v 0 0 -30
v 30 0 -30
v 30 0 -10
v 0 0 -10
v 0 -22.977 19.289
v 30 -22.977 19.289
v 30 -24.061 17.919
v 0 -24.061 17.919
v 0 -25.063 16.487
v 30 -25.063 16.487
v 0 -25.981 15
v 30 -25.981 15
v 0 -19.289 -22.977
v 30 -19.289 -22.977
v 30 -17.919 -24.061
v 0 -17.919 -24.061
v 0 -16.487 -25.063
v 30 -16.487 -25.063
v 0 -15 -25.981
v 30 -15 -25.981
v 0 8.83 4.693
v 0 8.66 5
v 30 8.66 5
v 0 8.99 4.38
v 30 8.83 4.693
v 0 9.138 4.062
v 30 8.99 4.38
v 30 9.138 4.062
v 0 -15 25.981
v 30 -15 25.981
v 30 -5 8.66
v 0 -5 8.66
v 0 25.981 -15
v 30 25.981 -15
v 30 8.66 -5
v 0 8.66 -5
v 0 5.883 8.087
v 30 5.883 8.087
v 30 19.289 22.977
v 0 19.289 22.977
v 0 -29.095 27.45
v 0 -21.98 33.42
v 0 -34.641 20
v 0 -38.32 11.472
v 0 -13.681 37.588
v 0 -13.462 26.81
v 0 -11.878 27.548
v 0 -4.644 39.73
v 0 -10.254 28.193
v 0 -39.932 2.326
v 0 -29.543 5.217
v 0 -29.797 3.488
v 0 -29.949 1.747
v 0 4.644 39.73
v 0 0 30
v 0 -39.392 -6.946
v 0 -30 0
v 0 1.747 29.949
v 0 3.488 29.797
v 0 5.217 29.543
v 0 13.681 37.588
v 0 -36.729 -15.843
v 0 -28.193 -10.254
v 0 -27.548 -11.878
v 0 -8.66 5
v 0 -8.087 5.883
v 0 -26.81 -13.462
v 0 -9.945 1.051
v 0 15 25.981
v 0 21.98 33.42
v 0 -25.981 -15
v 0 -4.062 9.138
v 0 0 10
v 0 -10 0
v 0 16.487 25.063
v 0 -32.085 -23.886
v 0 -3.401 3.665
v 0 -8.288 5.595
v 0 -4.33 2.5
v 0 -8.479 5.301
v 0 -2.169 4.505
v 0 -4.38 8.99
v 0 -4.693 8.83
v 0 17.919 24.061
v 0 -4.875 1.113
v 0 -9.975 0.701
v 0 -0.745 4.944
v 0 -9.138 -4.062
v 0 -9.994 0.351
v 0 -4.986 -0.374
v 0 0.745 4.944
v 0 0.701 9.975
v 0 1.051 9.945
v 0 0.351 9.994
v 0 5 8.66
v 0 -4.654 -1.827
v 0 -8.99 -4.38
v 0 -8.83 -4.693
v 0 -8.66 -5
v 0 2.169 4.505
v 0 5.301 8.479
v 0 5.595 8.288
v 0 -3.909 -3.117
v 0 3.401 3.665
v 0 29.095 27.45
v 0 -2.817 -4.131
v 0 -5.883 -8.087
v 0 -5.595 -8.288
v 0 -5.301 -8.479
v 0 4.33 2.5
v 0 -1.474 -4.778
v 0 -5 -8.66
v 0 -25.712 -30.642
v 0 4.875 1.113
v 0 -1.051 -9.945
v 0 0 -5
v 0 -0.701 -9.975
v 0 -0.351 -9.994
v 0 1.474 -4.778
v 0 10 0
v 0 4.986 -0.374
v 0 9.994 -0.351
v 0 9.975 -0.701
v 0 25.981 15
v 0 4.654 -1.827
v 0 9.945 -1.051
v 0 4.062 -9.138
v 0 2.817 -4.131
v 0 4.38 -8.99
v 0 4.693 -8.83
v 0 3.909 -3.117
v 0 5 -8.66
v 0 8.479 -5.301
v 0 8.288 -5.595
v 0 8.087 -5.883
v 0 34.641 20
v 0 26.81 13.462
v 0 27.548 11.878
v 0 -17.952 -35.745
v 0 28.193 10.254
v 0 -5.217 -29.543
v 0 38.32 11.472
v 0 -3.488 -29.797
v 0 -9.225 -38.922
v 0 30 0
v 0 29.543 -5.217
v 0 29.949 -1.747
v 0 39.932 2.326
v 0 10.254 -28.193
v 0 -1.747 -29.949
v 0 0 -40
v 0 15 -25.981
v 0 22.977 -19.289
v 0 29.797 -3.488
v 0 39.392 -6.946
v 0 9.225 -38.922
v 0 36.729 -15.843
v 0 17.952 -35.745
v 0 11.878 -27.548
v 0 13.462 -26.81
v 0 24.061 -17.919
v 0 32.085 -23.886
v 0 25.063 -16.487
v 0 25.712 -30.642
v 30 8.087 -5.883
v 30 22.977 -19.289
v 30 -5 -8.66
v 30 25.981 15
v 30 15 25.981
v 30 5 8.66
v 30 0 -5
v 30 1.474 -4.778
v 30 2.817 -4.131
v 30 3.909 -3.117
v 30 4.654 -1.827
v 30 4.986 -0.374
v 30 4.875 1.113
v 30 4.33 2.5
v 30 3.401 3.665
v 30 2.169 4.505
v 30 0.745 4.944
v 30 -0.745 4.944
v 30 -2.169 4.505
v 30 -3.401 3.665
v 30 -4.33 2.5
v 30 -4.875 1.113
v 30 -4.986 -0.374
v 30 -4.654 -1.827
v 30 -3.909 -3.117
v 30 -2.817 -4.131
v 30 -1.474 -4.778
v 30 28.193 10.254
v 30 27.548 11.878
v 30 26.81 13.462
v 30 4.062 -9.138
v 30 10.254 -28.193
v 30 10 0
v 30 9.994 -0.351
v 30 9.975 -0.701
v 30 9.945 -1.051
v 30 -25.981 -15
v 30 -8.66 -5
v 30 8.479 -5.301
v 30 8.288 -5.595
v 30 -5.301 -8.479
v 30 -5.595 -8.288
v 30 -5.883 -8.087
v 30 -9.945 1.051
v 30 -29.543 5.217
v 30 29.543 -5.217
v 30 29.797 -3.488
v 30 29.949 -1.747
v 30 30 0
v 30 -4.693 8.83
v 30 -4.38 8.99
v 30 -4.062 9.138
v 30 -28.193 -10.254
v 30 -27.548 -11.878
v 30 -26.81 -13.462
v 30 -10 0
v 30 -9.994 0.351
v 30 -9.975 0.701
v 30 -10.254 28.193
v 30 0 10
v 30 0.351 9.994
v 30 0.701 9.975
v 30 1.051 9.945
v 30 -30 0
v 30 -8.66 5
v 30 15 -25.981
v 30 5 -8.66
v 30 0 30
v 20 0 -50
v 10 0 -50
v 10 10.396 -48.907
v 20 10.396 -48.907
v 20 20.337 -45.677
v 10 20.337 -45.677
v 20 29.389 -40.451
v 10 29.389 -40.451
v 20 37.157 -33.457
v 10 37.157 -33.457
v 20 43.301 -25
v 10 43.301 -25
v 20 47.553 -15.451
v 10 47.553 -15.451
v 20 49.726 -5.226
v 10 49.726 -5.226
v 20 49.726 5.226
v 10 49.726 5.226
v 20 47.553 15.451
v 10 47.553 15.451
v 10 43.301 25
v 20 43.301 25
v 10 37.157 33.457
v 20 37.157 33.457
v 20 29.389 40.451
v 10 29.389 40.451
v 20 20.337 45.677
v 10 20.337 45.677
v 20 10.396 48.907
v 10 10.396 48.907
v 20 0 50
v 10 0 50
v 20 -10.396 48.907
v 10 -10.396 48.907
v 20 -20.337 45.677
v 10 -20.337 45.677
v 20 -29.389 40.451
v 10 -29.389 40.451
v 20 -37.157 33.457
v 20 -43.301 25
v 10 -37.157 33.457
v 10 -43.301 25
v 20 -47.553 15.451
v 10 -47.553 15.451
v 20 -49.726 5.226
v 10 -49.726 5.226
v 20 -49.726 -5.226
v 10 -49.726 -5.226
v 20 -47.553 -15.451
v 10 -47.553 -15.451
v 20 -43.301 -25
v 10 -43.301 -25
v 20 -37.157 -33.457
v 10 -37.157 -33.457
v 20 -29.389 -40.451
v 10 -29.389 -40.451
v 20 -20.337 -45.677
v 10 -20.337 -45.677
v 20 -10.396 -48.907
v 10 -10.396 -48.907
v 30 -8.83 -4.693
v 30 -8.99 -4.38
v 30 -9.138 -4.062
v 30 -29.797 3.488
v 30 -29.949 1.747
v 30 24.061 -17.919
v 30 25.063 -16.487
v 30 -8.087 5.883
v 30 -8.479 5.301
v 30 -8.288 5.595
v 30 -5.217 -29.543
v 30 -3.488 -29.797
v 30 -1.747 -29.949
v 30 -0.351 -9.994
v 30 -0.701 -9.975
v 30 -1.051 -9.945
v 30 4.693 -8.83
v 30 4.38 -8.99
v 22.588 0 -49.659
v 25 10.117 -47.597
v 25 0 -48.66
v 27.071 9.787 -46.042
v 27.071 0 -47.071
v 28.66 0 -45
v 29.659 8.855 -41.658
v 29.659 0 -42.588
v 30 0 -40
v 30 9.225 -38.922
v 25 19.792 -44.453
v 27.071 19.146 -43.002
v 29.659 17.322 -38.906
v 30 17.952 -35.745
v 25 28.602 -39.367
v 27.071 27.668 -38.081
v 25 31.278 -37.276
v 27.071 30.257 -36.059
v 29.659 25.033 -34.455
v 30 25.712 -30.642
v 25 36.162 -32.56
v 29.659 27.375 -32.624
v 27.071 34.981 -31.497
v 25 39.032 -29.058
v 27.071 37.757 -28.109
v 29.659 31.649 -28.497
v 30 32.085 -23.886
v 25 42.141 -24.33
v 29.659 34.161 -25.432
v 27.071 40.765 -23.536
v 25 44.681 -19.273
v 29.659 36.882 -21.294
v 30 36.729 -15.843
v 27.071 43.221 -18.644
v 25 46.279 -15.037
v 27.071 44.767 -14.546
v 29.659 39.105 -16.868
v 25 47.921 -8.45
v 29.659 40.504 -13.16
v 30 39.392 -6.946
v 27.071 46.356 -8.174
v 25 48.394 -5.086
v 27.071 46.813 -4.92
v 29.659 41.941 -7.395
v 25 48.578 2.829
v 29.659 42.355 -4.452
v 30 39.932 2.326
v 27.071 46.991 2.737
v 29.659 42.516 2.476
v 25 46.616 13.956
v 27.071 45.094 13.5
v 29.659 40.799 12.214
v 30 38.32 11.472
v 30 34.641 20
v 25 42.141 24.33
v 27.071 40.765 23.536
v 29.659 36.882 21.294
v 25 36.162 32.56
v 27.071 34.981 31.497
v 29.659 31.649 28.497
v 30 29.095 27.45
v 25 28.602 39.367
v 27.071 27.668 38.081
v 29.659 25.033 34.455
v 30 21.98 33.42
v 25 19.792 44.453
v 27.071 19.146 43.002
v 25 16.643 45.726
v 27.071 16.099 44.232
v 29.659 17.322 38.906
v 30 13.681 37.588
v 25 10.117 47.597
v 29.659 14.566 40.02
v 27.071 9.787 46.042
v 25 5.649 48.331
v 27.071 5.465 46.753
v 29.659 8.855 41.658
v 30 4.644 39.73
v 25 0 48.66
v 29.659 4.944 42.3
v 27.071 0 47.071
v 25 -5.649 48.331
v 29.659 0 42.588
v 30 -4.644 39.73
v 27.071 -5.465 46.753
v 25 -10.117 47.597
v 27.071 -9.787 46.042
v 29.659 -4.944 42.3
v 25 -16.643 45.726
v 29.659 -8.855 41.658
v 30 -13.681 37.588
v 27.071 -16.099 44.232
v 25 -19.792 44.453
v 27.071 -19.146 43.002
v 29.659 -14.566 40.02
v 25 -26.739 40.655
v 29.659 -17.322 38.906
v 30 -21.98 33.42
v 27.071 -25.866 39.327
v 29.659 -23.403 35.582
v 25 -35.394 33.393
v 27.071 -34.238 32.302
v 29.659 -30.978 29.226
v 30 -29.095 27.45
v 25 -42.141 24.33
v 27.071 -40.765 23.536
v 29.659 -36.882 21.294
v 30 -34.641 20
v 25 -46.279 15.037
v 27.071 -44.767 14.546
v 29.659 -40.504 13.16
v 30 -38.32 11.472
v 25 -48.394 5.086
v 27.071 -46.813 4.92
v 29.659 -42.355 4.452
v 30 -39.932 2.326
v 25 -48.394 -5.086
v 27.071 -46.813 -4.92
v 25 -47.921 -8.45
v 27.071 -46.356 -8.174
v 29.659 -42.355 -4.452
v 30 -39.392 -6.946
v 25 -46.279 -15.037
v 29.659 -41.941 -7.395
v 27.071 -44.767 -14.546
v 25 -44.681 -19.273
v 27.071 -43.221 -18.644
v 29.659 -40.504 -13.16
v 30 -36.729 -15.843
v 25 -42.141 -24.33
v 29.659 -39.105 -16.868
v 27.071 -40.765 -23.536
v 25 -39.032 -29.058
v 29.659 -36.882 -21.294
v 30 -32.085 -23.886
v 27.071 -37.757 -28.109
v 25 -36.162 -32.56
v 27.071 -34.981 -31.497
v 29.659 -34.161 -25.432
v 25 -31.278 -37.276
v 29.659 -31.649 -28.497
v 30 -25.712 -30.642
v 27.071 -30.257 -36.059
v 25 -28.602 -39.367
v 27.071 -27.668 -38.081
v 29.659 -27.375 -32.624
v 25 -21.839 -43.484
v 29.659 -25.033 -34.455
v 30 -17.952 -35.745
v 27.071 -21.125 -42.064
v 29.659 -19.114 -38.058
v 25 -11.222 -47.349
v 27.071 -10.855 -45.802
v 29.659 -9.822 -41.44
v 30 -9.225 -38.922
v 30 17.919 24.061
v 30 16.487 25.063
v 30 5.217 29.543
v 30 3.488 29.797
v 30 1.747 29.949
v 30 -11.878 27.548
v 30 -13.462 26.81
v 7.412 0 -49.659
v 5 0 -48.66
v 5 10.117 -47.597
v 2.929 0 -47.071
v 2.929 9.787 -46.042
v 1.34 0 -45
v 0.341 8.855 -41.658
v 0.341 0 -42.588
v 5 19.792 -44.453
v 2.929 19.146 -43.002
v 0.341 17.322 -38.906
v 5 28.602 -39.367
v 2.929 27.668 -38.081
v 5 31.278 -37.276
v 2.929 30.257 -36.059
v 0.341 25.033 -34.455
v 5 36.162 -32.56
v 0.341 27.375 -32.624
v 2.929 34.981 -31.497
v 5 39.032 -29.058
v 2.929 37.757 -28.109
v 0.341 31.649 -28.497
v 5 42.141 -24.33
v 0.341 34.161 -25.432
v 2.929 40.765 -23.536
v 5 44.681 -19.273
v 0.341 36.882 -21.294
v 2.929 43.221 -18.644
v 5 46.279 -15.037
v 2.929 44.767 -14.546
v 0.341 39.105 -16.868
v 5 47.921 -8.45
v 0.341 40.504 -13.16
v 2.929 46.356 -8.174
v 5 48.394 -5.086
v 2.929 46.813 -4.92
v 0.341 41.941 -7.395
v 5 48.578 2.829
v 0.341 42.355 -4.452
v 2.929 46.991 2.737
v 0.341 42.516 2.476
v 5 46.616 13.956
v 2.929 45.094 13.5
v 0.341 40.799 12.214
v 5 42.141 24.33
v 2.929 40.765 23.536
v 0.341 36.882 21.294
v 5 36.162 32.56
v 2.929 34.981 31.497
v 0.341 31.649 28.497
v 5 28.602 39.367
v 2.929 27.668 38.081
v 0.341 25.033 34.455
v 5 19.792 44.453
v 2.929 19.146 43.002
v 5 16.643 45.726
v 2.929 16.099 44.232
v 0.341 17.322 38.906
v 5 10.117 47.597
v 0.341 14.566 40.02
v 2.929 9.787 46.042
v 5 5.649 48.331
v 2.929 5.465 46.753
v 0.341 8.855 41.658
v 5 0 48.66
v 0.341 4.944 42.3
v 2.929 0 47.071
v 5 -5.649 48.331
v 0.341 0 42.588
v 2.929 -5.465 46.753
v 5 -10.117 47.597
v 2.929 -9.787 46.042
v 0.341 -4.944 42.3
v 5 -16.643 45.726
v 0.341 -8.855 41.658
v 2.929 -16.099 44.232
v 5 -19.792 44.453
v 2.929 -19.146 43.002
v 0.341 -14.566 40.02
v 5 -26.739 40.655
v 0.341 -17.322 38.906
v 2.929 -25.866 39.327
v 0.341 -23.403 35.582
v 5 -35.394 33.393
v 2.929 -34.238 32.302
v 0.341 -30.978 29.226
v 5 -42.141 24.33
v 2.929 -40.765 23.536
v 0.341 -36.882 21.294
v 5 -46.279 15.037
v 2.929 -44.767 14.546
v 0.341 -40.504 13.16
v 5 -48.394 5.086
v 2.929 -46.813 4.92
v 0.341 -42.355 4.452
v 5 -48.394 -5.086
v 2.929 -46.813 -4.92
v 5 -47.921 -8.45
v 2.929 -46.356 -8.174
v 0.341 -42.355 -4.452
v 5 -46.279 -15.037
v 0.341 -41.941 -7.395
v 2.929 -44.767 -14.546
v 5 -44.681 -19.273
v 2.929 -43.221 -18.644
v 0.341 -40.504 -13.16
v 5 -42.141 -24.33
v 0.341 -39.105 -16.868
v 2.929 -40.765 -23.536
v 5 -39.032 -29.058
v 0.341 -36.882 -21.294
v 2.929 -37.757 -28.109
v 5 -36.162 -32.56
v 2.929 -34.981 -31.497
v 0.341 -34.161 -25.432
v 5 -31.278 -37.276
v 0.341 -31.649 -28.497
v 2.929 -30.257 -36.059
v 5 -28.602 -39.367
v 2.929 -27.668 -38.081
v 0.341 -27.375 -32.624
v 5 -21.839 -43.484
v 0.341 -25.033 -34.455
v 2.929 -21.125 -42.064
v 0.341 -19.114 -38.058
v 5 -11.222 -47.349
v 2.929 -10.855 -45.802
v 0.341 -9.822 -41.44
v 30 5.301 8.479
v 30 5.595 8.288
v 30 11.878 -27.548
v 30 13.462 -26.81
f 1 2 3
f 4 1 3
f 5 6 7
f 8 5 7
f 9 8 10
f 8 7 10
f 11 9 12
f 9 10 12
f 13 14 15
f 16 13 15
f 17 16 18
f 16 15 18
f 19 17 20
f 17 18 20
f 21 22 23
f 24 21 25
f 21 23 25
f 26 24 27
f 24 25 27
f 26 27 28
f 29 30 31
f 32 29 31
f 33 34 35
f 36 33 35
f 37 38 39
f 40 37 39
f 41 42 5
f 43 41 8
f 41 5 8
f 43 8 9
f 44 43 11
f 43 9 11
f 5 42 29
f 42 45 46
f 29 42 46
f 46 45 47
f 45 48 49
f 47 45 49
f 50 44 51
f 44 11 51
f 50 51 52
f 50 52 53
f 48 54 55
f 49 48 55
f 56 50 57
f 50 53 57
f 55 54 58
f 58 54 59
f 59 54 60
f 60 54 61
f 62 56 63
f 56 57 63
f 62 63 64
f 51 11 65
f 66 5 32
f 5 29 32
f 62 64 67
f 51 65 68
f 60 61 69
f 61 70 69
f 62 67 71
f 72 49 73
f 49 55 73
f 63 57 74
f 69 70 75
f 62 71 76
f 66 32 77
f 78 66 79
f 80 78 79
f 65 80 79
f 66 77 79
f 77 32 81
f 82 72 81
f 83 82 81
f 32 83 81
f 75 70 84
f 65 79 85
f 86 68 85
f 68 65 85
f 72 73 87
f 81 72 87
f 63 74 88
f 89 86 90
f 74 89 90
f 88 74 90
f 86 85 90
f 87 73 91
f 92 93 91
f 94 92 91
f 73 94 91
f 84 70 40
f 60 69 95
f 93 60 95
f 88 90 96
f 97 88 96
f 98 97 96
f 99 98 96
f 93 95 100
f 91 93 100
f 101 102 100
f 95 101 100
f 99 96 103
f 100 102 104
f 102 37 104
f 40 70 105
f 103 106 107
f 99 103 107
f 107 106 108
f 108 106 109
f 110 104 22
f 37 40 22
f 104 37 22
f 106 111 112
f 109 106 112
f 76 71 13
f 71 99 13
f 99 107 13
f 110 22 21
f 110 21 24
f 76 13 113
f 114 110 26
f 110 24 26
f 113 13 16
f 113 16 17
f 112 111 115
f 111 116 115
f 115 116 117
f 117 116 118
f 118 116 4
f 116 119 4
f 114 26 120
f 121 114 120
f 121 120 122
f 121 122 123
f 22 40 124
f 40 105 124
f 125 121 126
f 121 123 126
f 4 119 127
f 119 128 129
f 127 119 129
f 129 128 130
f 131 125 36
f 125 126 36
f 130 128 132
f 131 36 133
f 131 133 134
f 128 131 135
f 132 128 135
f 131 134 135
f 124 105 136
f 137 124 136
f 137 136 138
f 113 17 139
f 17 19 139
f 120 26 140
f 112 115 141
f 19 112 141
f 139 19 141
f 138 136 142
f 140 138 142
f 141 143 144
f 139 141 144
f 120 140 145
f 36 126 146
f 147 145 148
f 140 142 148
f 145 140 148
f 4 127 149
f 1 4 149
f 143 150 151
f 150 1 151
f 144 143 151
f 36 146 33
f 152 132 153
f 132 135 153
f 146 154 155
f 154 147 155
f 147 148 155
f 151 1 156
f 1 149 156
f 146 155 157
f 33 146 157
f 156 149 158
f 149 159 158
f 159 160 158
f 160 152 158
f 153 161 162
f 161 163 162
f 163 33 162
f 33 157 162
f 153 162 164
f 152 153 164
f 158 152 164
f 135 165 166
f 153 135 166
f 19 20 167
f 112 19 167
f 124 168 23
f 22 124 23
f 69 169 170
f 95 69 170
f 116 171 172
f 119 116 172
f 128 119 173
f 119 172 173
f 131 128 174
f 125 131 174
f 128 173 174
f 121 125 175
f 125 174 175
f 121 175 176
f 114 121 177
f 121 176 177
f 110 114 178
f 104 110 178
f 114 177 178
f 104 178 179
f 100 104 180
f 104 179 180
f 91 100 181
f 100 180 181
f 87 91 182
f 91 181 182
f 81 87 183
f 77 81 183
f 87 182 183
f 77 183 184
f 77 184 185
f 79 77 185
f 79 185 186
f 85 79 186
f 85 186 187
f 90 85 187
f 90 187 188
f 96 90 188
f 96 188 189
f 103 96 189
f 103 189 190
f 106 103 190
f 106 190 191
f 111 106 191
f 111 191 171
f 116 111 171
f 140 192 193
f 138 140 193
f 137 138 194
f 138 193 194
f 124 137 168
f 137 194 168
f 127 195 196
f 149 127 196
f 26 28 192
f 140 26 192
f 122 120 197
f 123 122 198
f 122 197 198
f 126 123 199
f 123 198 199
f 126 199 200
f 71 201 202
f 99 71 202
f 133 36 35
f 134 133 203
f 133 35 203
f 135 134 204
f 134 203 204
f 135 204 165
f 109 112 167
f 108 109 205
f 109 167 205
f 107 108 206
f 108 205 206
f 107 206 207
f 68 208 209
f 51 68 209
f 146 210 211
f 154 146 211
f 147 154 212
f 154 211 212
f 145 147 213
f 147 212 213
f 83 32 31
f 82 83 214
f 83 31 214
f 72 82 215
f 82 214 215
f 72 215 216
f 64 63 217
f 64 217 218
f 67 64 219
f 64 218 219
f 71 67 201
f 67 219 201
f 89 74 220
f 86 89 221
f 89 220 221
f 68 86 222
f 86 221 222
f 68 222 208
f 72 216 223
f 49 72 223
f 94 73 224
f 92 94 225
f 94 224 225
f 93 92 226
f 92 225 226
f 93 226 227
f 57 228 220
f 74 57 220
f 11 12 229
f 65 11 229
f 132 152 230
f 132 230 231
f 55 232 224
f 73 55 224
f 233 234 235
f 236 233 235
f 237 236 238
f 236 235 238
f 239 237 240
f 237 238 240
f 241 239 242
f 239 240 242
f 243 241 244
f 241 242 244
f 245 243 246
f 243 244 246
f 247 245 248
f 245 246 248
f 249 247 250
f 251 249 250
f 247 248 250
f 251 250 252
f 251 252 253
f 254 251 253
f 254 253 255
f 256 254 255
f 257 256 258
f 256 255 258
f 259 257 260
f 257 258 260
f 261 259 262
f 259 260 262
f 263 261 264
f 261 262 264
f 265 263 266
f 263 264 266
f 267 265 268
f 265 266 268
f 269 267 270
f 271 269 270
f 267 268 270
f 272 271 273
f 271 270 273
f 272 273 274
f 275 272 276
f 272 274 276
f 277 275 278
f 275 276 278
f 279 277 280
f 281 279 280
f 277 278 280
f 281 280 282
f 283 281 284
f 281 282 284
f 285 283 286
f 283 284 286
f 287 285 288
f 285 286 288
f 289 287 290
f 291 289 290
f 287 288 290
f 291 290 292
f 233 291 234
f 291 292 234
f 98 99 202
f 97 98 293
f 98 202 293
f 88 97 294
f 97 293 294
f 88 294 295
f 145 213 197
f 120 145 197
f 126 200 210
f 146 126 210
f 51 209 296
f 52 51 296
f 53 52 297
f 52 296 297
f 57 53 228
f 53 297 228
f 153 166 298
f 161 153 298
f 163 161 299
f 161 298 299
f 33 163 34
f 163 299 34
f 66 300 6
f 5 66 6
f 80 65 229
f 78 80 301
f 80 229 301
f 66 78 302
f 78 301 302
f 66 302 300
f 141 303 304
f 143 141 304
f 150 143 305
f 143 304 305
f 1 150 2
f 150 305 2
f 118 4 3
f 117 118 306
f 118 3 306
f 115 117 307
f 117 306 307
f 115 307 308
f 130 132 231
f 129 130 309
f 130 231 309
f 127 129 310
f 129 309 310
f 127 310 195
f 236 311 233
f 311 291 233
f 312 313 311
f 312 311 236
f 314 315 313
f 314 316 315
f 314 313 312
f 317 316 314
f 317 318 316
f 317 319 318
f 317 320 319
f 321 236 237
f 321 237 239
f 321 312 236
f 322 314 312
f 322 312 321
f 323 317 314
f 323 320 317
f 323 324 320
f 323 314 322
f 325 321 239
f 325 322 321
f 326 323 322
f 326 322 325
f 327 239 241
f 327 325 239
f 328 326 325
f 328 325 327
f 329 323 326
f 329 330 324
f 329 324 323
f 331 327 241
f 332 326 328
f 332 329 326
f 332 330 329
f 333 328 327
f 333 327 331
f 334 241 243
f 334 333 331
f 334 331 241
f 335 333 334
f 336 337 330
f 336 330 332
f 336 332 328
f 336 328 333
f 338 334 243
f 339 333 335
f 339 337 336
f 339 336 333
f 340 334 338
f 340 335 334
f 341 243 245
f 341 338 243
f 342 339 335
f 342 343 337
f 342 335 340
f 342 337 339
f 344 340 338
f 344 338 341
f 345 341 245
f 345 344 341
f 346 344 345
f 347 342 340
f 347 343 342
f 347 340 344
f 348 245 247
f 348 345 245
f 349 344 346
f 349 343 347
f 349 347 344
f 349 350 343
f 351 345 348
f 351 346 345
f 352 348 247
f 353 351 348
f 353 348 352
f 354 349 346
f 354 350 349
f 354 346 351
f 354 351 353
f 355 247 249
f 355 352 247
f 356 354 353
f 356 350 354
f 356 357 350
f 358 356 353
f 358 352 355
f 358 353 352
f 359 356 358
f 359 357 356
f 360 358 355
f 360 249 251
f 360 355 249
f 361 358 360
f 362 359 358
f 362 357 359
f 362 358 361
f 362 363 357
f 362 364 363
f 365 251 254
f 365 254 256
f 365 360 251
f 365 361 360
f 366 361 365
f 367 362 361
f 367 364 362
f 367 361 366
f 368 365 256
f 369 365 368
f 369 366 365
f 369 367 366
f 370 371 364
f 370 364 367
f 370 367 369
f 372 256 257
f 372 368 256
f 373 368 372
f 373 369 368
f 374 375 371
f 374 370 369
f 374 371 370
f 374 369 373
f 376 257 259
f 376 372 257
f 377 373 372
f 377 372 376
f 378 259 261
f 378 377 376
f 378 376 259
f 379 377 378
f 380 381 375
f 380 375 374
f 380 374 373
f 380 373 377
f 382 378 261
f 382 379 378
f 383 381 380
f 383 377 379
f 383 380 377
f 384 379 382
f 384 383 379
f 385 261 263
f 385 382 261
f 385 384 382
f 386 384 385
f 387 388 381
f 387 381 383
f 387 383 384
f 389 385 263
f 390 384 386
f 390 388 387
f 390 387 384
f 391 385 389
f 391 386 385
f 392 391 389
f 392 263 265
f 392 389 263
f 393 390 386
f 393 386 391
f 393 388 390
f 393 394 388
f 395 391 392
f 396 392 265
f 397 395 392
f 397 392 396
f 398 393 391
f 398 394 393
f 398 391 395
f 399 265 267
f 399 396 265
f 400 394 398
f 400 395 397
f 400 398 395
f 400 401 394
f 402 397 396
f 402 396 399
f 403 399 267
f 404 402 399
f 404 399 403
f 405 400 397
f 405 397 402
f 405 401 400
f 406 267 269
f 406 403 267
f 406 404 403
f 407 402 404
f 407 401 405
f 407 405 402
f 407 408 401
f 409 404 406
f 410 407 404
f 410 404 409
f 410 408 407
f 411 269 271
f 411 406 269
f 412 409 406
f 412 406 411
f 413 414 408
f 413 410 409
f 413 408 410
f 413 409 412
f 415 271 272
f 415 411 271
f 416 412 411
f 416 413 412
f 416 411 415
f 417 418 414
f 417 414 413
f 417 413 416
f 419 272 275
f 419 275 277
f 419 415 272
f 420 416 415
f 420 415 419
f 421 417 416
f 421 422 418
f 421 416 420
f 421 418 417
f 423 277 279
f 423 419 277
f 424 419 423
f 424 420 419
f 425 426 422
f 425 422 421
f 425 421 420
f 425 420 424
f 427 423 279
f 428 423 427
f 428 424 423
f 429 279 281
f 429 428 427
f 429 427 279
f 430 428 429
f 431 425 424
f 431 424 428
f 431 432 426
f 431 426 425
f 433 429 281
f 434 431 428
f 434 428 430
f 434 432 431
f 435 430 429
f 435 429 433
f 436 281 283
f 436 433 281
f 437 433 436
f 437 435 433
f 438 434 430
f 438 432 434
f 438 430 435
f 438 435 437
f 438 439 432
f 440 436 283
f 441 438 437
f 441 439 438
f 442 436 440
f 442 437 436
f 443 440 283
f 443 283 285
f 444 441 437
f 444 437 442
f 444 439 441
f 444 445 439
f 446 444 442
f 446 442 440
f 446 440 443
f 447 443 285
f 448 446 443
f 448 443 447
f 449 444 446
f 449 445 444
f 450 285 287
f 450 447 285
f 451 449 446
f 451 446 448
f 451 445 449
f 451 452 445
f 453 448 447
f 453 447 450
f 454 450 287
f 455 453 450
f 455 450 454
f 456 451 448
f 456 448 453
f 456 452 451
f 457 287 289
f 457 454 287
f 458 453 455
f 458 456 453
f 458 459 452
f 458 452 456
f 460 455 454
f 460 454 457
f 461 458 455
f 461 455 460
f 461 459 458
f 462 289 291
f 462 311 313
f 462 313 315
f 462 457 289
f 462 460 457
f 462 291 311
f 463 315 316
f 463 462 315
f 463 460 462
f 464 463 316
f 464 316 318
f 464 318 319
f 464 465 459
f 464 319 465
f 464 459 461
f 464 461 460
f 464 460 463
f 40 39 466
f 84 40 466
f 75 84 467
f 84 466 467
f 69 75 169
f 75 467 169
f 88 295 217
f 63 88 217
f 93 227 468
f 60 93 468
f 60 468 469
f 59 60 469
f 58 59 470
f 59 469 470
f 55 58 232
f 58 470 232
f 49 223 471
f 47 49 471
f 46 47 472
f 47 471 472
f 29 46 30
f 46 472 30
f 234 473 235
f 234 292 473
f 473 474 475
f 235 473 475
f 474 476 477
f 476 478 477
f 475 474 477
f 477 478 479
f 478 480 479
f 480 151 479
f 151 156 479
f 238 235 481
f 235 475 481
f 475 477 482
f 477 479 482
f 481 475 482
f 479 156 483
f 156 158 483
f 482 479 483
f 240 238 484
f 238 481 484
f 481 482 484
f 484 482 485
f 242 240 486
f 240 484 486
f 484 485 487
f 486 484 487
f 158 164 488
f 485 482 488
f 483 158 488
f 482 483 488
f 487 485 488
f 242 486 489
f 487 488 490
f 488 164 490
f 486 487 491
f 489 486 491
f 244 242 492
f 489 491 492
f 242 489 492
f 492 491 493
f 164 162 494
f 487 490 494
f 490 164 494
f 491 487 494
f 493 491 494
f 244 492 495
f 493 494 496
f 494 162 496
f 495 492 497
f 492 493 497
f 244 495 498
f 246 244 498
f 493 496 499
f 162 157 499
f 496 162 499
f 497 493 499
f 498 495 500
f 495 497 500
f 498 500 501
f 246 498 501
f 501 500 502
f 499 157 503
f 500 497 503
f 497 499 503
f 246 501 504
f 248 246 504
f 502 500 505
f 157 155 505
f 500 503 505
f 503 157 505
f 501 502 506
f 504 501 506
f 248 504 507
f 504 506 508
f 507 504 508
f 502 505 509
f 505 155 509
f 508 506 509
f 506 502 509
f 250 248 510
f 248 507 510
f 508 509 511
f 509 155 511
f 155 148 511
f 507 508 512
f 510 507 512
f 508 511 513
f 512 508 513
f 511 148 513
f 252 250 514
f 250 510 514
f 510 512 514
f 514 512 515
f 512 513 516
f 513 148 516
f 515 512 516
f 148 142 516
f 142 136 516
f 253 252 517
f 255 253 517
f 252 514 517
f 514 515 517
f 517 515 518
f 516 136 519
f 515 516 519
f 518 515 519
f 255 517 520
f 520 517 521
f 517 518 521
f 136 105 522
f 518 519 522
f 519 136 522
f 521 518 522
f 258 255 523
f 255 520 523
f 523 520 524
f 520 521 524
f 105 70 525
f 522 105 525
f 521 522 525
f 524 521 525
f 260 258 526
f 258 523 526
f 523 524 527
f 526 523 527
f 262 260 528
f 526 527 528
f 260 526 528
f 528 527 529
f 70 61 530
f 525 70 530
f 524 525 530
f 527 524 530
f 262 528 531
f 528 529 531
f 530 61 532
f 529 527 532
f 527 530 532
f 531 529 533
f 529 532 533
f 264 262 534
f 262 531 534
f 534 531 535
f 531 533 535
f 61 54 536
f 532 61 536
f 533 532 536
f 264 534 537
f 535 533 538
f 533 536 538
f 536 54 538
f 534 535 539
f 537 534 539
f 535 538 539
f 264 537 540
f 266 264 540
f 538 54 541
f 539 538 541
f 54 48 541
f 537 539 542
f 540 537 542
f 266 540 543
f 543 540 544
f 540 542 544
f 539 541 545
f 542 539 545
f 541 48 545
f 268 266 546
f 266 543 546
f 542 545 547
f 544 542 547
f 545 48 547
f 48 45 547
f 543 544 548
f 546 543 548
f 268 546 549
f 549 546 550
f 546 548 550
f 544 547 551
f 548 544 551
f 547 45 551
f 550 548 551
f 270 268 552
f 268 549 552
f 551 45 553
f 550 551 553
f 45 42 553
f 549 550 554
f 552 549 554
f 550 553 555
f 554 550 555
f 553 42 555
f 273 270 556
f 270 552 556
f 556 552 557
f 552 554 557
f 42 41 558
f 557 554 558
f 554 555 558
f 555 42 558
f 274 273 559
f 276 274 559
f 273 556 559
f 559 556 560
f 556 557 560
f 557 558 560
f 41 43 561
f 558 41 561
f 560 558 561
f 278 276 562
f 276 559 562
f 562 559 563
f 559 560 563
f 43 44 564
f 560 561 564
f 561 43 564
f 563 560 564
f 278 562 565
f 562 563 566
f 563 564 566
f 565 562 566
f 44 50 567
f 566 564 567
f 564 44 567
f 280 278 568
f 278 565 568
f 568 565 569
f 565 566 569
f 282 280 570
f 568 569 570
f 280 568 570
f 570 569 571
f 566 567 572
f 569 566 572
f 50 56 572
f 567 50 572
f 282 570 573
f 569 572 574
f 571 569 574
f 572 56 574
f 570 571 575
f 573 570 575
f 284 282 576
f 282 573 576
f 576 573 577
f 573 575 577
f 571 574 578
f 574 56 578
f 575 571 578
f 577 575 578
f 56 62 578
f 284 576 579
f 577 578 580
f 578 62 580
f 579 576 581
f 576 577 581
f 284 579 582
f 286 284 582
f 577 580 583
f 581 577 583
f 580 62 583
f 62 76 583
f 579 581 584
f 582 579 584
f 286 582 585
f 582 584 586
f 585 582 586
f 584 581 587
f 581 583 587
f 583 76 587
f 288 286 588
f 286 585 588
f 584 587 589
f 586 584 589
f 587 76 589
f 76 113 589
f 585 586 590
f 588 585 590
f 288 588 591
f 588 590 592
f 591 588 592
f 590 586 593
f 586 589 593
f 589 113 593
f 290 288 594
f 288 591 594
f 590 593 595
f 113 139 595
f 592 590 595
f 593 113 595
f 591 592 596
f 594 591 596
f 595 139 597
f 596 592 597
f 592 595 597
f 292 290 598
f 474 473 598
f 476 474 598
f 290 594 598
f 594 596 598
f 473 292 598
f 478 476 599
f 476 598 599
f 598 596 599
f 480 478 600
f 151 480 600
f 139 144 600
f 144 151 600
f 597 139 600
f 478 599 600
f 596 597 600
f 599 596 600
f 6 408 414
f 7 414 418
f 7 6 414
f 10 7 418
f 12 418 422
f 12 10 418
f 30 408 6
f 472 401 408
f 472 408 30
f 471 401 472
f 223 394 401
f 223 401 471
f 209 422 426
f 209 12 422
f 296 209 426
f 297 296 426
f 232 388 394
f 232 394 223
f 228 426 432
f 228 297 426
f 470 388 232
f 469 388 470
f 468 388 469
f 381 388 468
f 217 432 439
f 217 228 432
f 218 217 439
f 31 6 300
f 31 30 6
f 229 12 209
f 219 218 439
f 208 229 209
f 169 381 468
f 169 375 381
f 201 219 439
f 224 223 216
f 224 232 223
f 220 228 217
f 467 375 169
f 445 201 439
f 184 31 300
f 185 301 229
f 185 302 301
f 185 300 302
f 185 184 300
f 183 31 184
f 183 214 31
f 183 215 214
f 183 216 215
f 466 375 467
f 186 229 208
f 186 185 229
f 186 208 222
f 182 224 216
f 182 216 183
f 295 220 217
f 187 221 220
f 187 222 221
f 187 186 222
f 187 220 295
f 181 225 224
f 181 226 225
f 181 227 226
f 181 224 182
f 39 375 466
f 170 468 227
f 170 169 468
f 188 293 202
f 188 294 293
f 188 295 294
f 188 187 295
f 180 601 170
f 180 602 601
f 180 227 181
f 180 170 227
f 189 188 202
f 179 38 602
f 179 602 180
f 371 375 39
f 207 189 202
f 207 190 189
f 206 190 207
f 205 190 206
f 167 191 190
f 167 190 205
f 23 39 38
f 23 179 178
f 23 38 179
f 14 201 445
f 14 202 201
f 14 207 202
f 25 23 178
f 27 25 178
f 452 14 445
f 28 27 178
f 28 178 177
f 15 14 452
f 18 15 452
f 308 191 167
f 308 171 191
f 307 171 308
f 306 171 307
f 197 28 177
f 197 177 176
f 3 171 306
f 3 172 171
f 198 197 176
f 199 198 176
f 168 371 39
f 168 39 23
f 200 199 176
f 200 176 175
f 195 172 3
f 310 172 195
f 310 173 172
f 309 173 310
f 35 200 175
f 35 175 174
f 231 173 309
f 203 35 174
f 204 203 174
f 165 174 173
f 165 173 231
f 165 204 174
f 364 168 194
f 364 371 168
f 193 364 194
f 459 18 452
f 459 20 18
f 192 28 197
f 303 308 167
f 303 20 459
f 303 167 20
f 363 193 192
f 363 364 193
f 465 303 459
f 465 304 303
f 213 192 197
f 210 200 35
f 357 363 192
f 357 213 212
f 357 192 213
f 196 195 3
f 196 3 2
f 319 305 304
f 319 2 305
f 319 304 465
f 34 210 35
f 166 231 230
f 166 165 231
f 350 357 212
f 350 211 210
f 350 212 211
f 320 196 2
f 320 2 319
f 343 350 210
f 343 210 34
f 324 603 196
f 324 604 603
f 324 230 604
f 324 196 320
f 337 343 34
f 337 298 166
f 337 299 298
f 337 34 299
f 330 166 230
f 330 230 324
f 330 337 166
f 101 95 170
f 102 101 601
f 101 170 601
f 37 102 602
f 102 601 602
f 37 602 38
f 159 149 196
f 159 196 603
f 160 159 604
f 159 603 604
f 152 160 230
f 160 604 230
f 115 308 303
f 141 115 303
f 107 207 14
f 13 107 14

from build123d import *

# Parameters (mm, degrees)
SKETCH1_R           = 50
BOSS_EXTRUDE1_DEPTH = 30
SKETCH2_R           = 5
CUT_EXTRUDE1_DEPTH  = 31
CUT_EXTRUDE10_DEPTH = 31
CIRPATTERN1_COUNT   = 12
FILLET1_R           = 10


with BuildPart() as part:
    # Sketch1 → Boss-Extrude1 (new body)
    with BuildSketch(Plane(origin=(0, 0, 0), x_dir=(0, 0, -1), z_dir=(1, 0, 0))):
        Circle(SKETCH1_R)
    extrude(amount=BOSS_EXTRUDE1_DEPTH)

    # Sketch2 → Cut-Extrude1 (cut, through all)
    with BuildSketch(Plane(origin=(30, 0, 0), x_dir=(0, 0, -1), z_dir=(1, 0, 0))):
        Circle(SKETCH2_R)
    extrude(amount=-CUT_EXTRUDE1_DEPTH, mode=Mode.SUBTRACT)

    # Sketch3 → Cut-Extrude10 (cut, through all)
    with BuildSketch(Plane(origin=(30, 0, 0), x_dir=(0, 0, -1), z_dir=(1, 0, 0))):
        with BuildLine():
            Line((0, -30), (0, -10))
            ThreePointArc((0, -10), (-0.526234368, -9.98614427), (-1.051010465, -9.944615478))
            Line((-1.051010465, -9.944615478), (-5.216763219, -29.542941315))
            ThreePointArc((-5.216763219, -29.542941315), (-2.618373595, -29.885516889), (0, -30))
        make_face()
    cut_extrude10 = extrude(amount=-CUT_EXTRUDE10_DEPTH, mode=Mode.SUBTRACT)

    # CirPattern1: Cut-Extrude10 ×12 about axis
    cirpattern1_axis = Axis((0, 0, 0), (1, 0, 0))
    for i in range(1, CIRPATTERN1_COUNT):
        add(cut_extrude10.rotate(cirpattern1_axis, i * 360 / CIRPATTERN1_COUNT), mode=Mode.SUBTRACT)

    # Fillet1
    fillet1_edges = [part.edges().sort_by_distance(p)[0] for p in [
        (0, 0, 50),
        (30, 0, 50),
    ]]
    fillet(fillet1_edges, radius=FILLET1_R)


solid = part.part
